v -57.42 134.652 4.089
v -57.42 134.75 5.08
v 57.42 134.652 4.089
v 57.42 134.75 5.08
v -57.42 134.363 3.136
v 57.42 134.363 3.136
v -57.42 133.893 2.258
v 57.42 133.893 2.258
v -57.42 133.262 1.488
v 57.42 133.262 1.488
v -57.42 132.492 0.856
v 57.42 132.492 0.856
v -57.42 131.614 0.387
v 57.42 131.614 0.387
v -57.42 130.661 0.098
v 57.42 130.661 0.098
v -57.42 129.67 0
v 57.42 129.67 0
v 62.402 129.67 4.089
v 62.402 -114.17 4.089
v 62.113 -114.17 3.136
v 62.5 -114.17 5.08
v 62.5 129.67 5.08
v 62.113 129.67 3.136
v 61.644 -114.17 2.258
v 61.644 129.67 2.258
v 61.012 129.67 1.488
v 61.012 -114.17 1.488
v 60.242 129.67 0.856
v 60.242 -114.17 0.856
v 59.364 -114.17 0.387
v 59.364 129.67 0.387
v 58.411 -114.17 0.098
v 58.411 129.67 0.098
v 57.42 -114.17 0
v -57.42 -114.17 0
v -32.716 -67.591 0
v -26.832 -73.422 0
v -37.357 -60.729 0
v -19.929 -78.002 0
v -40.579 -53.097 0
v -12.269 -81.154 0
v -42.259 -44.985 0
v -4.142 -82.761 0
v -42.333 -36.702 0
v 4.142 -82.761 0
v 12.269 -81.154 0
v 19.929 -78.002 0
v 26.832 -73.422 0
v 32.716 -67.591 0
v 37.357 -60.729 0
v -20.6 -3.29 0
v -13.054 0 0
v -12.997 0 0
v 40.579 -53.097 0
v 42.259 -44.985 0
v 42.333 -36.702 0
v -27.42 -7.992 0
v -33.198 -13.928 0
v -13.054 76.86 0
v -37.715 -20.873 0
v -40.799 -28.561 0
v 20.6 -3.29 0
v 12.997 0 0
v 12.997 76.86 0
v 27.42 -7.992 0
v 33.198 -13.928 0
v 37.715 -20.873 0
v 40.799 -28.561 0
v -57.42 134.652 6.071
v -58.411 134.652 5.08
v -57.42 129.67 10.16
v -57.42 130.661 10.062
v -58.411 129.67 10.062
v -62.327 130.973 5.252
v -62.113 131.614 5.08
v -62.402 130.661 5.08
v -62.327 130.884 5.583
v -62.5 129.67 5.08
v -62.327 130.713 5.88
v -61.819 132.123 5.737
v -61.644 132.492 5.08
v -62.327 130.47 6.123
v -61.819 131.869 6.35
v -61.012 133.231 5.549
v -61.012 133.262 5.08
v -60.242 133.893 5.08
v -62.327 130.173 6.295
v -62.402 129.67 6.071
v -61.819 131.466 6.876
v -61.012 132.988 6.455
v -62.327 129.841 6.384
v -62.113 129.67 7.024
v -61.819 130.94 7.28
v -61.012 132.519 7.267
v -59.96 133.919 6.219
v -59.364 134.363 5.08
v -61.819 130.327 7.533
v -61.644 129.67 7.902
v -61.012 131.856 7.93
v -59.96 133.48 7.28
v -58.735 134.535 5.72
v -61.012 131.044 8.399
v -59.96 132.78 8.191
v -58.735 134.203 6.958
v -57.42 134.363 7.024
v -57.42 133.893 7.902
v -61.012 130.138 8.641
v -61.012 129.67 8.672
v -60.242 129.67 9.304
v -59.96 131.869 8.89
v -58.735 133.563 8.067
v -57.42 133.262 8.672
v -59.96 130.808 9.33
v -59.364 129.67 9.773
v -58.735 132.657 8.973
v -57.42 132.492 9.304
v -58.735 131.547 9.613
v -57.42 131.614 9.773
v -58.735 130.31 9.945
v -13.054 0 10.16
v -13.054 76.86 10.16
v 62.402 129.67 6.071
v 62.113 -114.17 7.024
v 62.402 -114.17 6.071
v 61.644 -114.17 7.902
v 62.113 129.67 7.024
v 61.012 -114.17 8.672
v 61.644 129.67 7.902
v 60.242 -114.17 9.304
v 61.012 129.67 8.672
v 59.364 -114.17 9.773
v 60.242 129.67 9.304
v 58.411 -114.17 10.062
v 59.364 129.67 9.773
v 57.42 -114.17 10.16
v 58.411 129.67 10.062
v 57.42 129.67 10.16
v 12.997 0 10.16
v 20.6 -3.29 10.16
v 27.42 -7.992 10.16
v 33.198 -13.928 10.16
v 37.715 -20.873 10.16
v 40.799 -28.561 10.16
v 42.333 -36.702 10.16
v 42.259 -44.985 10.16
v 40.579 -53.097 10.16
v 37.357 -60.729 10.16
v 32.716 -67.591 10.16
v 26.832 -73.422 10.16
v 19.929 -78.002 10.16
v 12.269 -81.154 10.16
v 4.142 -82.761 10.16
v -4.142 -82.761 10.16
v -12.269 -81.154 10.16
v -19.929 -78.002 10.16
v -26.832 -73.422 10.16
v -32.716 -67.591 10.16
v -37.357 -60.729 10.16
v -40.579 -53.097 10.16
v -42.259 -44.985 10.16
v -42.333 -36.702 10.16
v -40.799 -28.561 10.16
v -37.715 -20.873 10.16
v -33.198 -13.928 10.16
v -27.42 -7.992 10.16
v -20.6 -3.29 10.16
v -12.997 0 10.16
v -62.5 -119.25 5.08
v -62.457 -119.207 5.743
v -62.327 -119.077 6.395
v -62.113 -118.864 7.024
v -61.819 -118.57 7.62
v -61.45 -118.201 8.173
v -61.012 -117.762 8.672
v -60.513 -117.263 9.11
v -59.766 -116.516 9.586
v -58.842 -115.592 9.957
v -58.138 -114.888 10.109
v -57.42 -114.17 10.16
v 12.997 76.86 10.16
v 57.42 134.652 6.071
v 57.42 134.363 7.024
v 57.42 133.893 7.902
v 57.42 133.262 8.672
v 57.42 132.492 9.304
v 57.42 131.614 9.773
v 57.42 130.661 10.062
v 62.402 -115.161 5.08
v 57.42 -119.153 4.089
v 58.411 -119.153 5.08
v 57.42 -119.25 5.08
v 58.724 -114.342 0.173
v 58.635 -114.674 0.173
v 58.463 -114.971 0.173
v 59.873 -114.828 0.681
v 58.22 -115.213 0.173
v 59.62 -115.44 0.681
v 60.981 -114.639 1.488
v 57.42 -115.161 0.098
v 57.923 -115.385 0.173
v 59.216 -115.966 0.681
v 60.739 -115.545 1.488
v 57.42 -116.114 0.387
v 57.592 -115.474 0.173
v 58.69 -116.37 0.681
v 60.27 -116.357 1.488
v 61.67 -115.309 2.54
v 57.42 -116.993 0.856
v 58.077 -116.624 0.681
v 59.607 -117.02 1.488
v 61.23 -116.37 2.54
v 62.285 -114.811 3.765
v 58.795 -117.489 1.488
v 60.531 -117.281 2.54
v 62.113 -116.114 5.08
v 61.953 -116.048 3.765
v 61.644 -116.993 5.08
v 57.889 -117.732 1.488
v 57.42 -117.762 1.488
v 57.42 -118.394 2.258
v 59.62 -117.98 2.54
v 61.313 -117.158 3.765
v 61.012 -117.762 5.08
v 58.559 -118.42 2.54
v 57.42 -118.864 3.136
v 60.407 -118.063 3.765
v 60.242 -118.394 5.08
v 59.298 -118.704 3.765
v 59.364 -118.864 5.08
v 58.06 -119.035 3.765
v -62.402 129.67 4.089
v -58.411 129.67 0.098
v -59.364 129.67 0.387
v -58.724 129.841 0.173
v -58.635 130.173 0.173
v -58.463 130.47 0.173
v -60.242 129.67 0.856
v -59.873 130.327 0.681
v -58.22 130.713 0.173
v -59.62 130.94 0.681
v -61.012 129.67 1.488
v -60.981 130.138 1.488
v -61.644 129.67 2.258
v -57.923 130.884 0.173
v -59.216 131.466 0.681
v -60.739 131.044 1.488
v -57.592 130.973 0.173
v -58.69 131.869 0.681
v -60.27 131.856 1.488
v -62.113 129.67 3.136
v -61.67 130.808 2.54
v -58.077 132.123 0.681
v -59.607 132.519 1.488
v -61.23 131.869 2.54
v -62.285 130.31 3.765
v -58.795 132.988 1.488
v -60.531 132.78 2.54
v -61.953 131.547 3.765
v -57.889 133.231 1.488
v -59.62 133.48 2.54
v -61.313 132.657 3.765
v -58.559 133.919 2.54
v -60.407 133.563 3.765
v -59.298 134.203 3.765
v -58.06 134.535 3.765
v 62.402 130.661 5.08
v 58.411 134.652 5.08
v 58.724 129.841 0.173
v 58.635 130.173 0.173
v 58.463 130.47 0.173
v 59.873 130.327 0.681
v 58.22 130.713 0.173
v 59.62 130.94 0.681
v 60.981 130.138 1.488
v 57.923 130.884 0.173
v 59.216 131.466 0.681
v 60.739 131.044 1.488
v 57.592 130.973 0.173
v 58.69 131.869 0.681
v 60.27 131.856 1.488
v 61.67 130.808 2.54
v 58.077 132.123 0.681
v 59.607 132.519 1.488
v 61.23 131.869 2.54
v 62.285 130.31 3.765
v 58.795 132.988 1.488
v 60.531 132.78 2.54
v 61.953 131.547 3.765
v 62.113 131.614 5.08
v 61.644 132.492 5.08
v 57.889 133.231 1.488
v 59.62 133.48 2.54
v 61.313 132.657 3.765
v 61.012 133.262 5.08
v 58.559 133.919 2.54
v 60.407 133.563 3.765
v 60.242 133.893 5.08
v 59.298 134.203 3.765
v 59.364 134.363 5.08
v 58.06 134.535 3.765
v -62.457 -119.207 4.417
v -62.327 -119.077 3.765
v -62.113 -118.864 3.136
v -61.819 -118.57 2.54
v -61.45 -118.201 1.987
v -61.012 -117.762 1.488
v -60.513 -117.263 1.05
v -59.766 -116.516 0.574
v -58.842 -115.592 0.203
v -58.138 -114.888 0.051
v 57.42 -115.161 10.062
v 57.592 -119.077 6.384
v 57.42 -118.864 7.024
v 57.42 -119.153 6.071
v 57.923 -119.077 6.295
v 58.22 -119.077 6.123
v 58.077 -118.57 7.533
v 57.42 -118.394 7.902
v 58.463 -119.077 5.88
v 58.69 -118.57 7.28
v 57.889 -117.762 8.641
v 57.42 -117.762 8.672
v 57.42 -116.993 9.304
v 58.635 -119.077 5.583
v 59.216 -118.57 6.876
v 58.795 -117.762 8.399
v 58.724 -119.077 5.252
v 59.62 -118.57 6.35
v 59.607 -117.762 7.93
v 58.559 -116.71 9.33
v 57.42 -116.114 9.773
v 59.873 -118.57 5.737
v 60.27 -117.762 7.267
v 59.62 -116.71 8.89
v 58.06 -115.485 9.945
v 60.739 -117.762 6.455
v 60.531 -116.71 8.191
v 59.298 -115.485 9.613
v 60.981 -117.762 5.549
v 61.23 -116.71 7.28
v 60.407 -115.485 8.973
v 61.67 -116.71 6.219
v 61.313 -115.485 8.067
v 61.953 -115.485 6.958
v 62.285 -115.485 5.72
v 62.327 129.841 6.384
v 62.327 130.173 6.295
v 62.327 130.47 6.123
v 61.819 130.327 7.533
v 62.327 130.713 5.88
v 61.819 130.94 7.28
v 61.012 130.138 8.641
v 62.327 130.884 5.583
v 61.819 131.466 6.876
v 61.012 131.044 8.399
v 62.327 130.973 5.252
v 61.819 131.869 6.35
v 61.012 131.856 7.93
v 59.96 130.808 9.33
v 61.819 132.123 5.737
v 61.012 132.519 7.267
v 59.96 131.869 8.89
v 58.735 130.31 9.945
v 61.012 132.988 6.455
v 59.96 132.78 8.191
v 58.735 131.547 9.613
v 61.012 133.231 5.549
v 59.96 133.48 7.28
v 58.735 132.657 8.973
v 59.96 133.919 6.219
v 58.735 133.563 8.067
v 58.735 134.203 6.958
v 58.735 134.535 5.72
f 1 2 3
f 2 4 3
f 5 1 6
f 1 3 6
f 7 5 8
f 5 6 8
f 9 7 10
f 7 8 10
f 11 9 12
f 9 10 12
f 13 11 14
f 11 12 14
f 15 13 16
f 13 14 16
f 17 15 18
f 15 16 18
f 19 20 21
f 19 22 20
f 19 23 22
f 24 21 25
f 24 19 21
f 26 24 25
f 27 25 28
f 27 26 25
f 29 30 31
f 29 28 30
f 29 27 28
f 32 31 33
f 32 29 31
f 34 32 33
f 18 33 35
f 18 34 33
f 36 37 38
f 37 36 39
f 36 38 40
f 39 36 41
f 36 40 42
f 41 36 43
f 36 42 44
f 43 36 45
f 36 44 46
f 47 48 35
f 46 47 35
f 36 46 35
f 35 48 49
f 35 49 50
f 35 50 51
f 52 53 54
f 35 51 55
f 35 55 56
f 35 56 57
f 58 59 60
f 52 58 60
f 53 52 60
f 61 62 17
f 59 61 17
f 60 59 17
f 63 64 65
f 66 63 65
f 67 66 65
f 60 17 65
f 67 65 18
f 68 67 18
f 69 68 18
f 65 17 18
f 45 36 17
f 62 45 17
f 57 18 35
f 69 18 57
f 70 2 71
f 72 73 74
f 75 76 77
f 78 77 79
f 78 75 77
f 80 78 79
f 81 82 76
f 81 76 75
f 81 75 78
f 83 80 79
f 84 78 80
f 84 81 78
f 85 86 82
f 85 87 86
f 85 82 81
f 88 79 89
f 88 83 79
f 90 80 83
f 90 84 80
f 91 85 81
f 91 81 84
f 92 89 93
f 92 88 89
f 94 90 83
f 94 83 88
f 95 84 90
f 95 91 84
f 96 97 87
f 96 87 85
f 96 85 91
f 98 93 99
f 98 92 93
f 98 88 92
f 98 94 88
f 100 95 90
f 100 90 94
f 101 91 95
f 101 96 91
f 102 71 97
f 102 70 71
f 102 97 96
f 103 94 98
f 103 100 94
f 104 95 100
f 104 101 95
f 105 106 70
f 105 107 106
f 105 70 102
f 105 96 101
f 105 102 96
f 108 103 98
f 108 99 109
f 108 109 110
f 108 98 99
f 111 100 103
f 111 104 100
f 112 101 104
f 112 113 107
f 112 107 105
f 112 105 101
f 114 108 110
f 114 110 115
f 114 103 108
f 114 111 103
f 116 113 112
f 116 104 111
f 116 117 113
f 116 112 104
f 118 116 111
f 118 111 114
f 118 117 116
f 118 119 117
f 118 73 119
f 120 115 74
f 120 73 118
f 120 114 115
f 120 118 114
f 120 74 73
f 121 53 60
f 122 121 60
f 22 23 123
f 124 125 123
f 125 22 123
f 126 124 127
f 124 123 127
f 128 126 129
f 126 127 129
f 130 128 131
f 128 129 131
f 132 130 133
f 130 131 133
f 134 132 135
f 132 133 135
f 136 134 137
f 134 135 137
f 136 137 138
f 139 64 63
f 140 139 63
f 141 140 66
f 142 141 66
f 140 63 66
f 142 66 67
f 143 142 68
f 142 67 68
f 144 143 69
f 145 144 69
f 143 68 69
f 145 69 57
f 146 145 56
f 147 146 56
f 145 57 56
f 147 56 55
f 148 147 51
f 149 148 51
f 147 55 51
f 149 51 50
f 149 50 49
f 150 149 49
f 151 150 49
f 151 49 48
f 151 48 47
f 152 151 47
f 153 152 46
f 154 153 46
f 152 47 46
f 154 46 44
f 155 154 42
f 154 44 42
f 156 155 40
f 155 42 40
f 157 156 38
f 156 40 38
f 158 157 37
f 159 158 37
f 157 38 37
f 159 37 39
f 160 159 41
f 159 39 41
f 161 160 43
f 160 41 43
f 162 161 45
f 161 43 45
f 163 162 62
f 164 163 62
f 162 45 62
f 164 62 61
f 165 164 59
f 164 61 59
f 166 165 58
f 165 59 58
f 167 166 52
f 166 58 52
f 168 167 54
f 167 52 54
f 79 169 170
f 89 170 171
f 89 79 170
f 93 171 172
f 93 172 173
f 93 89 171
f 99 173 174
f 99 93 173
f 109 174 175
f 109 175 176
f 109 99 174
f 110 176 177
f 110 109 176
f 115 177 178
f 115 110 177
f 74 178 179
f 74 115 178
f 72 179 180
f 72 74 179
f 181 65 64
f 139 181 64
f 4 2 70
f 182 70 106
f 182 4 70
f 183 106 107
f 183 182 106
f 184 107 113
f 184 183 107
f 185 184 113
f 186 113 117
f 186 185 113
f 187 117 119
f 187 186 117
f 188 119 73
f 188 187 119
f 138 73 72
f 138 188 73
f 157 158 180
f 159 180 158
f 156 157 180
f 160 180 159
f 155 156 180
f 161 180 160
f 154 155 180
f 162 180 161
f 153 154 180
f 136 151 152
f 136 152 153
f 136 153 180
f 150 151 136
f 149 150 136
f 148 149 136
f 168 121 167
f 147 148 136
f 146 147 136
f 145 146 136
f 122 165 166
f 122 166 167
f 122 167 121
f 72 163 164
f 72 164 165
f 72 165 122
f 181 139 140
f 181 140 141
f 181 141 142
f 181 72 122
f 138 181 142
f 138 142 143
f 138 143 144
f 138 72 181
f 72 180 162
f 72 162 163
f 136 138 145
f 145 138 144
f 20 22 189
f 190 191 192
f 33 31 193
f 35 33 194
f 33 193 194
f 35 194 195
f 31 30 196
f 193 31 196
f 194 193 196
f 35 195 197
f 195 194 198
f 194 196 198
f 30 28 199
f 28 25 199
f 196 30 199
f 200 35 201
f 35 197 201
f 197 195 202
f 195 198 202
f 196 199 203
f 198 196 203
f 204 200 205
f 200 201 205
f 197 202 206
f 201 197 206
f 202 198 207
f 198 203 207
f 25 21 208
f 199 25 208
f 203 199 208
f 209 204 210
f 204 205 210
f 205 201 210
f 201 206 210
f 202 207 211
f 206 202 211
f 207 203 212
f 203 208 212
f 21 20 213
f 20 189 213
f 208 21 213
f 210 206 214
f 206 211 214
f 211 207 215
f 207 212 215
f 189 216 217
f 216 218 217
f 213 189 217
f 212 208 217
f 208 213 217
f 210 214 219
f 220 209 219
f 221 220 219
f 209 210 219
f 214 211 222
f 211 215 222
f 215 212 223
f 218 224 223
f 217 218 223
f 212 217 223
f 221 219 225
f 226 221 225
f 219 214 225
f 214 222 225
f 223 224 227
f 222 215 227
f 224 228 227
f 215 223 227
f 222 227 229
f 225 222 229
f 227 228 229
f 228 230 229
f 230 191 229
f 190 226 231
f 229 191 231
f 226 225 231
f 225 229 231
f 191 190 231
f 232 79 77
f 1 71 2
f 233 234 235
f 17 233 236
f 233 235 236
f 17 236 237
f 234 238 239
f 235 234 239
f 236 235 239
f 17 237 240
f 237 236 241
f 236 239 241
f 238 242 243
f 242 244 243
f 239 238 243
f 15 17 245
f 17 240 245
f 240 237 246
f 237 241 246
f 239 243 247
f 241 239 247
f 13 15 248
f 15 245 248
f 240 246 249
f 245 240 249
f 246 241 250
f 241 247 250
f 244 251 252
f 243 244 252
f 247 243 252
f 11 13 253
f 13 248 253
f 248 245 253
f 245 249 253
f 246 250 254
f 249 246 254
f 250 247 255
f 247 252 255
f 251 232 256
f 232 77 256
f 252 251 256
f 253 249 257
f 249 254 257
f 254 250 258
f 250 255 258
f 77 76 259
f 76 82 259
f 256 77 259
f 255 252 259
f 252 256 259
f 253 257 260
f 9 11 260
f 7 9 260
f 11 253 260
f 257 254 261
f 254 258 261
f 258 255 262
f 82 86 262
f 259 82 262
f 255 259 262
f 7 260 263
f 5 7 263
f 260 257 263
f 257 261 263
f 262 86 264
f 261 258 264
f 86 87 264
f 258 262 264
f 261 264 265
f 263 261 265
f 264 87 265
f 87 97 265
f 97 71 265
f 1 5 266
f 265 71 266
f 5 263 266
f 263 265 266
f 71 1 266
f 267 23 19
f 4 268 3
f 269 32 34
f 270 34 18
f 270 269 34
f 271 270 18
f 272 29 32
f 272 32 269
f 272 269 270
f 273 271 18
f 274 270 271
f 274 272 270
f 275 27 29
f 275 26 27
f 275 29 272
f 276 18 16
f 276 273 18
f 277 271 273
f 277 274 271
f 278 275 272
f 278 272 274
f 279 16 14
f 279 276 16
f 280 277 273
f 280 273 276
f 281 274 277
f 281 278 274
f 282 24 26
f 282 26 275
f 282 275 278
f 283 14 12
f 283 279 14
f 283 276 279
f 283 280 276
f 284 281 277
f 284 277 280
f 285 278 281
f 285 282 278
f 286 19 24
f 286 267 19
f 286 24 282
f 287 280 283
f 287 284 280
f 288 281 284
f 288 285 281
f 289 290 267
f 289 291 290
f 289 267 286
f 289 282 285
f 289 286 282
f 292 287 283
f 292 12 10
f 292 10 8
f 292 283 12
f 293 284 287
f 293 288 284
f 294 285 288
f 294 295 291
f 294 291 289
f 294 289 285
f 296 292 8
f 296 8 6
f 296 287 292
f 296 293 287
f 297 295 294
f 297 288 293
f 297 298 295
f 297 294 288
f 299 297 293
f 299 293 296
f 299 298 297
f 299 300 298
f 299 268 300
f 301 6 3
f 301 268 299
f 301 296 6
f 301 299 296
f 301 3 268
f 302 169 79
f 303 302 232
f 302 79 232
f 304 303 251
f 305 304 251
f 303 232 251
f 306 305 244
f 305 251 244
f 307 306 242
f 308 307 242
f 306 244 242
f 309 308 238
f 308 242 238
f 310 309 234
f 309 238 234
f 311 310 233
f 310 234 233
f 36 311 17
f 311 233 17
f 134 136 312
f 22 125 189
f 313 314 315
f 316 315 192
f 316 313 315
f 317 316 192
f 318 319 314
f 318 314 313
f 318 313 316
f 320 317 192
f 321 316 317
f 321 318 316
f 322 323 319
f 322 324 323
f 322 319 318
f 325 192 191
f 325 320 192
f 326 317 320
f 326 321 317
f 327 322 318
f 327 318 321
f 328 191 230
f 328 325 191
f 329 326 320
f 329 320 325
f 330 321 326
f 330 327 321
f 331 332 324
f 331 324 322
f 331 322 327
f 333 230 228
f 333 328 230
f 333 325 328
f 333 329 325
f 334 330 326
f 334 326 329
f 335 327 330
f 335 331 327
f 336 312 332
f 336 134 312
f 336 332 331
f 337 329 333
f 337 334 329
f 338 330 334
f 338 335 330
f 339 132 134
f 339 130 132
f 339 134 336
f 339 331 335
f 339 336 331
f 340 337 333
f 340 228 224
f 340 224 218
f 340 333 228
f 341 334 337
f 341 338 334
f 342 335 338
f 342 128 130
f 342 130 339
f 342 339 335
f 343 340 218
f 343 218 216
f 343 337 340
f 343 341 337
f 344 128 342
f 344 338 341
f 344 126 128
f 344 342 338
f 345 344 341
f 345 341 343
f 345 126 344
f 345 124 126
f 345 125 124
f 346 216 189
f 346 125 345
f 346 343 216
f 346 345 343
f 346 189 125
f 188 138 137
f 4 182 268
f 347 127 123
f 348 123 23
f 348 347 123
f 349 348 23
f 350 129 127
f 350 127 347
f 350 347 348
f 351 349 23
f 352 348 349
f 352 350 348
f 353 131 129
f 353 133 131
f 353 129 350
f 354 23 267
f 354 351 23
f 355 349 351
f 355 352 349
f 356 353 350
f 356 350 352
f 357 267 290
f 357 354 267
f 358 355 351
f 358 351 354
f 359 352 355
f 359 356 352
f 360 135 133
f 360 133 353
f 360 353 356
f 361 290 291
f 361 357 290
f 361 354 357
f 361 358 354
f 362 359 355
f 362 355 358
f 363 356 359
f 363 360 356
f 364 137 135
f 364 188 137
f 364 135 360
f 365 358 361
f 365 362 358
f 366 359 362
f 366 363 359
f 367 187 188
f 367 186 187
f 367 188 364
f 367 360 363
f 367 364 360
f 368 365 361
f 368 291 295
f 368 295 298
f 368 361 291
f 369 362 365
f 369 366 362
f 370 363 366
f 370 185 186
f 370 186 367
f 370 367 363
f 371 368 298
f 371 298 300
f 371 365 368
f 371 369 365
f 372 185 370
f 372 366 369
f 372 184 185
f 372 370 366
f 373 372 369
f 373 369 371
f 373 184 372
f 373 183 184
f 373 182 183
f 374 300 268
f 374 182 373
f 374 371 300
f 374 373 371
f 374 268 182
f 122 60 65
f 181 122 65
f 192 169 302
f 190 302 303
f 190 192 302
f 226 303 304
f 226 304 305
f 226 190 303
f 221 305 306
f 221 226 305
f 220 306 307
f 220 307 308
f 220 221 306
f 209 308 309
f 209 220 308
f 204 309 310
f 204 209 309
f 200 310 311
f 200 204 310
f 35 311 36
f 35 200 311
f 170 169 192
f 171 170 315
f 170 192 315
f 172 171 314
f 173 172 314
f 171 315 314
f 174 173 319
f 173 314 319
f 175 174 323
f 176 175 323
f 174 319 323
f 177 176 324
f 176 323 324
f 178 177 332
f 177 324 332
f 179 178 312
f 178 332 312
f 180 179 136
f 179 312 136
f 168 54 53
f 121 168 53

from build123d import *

# Parameters (mm, degrees)
F0_W     = 125
F0_H     = 254
F1_DEPTH = 10.16
F2_R     = 5.07999


# Not quite as in the source:
# - a fillet or chamfer is up to 0.001 mm smaller than in the source, because OpenCascade refuses the exact size


with BuildPart() as f1:
    # F0 (on Top) → F1 (new body)
    with BuildSketch(Plane.XY):
        with Locations((0, 7.7496204972)):
            Rectangle(F0_W, F0_H)
        with BuildLine():
            ThreePointArc((12.9974298287, 0), (34.3412344545, -15.4252090897), (42.5, -40.4637716711))
            ThreePointArc((42.5, -40.4637716711), (-25.0385625813, -74.8050061256), (-12.9974298287, 0))
            Line((-12.9974298287, 0), (-13.0543755367, 0))
            Line((-13.0543755367, 0), (-13.0543755367, 76.8597647548))
            Line((-13.0543755367, 76.8597647548), (12.9974298287, 76.8597647548))
            Line((12.9974298287, 76.8597647548), (12.9974298287, 0))
        make_face(mode=Mode.SUBTRACT)
    extrude(amount=F1_DEPTH)

    # F2 (radius 5.08 in the source; OpenCascade refuses exactly that, so slightly less here)
    f2_edges = [f1.edges().sort_by_distance(p)[0] for p in [
        (0, 134.74962, 10.16),
        (-62.5, 134.74962, 5.08),
        (-62.5, 7.74962, 10.16),
        (62.5, 7.74962, 10.16),
        (0, -119.25038, 10.16),
        (-62.5, 7.74962, 0),
        (62.5, -119.25038, 5.08),
        (62.5, 134.74962, 5.08),
        (62.5, 7.74962, 0),
        (0, -119.25038, 0),
        (0, 134.74962, 0),
    ]]
    fillet(f2_edges, radius=F2_R)


solid = f1.part
